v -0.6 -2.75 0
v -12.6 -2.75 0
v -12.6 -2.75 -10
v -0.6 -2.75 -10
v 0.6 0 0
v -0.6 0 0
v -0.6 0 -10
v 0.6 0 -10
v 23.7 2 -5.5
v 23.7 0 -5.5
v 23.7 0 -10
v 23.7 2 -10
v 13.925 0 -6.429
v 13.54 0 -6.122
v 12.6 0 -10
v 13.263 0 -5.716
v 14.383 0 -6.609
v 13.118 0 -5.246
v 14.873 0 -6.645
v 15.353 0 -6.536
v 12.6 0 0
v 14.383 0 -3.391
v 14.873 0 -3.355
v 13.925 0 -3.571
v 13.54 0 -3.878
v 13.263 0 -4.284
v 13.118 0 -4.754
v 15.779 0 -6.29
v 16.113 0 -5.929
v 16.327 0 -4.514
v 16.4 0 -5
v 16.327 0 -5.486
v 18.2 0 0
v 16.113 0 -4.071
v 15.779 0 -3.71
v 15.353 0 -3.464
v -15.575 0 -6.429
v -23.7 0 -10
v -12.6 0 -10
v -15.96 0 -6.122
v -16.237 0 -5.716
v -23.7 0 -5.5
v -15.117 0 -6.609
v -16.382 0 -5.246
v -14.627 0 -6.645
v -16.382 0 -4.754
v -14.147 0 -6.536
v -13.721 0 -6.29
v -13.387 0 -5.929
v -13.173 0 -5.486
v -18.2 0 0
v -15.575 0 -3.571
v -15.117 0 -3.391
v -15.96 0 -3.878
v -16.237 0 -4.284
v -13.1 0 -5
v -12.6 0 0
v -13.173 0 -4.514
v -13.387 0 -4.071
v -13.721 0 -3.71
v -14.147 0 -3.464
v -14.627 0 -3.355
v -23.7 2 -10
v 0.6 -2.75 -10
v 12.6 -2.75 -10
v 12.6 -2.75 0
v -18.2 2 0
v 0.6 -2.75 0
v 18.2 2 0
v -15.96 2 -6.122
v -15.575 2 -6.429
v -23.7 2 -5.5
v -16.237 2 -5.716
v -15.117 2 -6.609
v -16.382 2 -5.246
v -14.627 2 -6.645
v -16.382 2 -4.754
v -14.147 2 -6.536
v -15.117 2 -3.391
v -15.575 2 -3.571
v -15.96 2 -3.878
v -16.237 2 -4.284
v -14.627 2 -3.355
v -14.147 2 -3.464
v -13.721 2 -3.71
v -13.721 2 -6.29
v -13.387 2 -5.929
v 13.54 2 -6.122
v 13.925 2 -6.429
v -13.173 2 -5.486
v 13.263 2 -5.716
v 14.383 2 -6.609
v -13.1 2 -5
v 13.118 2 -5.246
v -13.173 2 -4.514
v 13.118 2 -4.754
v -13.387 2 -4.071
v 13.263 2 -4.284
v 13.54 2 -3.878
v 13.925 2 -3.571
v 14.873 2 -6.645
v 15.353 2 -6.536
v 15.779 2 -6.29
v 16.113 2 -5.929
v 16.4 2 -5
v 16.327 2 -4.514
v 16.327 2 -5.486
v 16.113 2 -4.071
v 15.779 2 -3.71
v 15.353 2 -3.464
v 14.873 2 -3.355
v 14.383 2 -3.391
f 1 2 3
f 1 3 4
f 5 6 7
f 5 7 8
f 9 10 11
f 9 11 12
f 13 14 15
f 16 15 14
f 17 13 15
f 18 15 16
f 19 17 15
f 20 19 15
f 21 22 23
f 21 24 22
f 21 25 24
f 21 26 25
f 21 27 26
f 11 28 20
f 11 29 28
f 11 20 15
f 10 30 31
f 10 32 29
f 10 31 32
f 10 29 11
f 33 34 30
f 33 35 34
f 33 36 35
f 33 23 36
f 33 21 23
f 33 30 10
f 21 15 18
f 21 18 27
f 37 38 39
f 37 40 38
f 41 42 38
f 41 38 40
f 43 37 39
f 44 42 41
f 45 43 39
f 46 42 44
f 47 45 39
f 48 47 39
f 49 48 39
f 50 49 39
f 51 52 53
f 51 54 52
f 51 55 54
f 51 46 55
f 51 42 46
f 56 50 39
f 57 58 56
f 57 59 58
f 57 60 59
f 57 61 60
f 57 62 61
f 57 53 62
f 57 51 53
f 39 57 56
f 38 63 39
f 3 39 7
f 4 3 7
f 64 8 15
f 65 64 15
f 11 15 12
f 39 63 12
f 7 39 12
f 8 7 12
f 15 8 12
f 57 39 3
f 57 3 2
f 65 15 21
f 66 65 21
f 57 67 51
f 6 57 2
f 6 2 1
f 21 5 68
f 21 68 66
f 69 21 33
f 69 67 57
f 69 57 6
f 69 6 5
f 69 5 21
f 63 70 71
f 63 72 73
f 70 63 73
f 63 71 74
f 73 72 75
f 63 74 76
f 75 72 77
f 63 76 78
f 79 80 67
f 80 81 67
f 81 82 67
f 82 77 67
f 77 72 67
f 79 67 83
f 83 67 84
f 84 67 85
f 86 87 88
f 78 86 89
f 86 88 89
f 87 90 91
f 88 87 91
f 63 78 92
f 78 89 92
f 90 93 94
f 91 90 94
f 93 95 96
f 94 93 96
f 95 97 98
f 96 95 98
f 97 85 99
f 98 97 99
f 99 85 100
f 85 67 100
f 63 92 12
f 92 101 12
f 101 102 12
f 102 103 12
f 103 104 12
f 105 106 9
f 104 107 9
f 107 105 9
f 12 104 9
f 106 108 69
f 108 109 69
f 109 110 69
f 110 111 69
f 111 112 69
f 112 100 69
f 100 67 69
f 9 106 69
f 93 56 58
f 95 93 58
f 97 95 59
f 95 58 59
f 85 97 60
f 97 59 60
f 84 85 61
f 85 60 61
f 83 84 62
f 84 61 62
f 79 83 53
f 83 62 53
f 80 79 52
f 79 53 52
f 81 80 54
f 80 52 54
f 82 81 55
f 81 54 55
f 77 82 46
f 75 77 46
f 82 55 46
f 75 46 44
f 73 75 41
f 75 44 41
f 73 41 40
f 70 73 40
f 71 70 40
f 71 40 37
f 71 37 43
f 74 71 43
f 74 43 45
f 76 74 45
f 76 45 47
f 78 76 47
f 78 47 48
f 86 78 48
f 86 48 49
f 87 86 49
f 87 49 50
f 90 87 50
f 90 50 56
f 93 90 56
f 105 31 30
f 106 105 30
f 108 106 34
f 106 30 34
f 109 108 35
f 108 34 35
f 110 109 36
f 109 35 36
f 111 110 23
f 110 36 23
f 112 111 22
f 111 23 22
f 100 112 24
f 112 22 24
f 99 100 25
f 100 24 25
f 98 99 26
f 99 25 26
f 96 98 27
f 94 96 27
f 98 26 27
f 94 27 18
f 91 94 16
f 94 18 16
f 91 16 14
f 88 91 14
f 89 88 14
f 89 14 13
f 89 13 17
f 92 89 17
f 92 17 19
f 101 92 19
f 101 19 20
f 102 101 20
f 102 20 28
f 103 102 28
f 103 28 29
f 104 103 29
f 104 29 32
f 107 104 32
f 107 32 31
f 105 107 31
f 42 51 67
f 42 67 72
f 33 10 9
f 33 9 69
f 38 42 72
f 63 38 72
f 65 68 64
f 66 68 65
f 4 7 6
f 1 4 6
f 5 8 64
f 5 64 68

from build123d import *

# Parameters (mm, degrees)
SKETCH_W             = 47.4
SKETCH_H             = 2
PAD_DEPTH            = 10
SKETCH002_W          = 12
SKETCH002_H          = 10
PAD001_DEPTH         = 2.75
SKETCH003_R          = 1.65
POCKET_DEPTH         = 2.001
POCKET_DEPTH_BACK    = 2.751
POCKET001_DEPTH      = 2.001
POCKET001_DEPTH_BACK = 2.751


with BuildPart() as part:
    # Sketch → Pad (new body)
    with BuildSketch(Plane.XY):
        with Locations((0, 1)):
            Rectangle(SKETCH_W, SKETCH_H)
    extrude(amount=-PAD_DEPTH)

    # Sketch002 → Pad001 (join)
    with BuildSketch(Plane.XZ):
        with Locations((-6.6, -5)):
            Rectangle(SKETCH002_W, SKETCH002_H)
        with Locations((6.6, -5)):
            Rectangle(SKETCH002_W, SKETCH002_H)
    extrude(amount=PAD001_DEPTH)

    # Sketch003 → Pocket (cut, two sides)
    with BuildSketch(Plane.XZ) as pocket_sk:
        with Locations((-14.75, -5)):
            Circle(SKETCH003_R)
        with Locations((14.75, -5)):
            Circle(SKETCH003_R)
    extrude(amount=-POCKET_DEPTH, mode=Mode.SUBTRACT)
    extrude(pocket_sk.sketch, amount=POCKET_DEPTH_BACK, mode=Mode.SUBTRACT)

    # Sketch004 → Pocket001 (cut, two sides)
    with BuildSketch(Plane.XZ) as pocket001_sk:
        Polygon((-18.2, 0), (-23.7, -5.5), (-23.7, 0), align=None)
        Polygon((18.2, 0), (23.7, 0), (23.7, -5.5), align=None)
    extrude(amount=-POCKET001_DEPTH, mode=Mode.SUBTRACT)
    extrude(pocket001_sk.sketch, amount=POCKET001_DEPTH_BACK, mode=Mode.SUBTRACT)


solid = part.part
